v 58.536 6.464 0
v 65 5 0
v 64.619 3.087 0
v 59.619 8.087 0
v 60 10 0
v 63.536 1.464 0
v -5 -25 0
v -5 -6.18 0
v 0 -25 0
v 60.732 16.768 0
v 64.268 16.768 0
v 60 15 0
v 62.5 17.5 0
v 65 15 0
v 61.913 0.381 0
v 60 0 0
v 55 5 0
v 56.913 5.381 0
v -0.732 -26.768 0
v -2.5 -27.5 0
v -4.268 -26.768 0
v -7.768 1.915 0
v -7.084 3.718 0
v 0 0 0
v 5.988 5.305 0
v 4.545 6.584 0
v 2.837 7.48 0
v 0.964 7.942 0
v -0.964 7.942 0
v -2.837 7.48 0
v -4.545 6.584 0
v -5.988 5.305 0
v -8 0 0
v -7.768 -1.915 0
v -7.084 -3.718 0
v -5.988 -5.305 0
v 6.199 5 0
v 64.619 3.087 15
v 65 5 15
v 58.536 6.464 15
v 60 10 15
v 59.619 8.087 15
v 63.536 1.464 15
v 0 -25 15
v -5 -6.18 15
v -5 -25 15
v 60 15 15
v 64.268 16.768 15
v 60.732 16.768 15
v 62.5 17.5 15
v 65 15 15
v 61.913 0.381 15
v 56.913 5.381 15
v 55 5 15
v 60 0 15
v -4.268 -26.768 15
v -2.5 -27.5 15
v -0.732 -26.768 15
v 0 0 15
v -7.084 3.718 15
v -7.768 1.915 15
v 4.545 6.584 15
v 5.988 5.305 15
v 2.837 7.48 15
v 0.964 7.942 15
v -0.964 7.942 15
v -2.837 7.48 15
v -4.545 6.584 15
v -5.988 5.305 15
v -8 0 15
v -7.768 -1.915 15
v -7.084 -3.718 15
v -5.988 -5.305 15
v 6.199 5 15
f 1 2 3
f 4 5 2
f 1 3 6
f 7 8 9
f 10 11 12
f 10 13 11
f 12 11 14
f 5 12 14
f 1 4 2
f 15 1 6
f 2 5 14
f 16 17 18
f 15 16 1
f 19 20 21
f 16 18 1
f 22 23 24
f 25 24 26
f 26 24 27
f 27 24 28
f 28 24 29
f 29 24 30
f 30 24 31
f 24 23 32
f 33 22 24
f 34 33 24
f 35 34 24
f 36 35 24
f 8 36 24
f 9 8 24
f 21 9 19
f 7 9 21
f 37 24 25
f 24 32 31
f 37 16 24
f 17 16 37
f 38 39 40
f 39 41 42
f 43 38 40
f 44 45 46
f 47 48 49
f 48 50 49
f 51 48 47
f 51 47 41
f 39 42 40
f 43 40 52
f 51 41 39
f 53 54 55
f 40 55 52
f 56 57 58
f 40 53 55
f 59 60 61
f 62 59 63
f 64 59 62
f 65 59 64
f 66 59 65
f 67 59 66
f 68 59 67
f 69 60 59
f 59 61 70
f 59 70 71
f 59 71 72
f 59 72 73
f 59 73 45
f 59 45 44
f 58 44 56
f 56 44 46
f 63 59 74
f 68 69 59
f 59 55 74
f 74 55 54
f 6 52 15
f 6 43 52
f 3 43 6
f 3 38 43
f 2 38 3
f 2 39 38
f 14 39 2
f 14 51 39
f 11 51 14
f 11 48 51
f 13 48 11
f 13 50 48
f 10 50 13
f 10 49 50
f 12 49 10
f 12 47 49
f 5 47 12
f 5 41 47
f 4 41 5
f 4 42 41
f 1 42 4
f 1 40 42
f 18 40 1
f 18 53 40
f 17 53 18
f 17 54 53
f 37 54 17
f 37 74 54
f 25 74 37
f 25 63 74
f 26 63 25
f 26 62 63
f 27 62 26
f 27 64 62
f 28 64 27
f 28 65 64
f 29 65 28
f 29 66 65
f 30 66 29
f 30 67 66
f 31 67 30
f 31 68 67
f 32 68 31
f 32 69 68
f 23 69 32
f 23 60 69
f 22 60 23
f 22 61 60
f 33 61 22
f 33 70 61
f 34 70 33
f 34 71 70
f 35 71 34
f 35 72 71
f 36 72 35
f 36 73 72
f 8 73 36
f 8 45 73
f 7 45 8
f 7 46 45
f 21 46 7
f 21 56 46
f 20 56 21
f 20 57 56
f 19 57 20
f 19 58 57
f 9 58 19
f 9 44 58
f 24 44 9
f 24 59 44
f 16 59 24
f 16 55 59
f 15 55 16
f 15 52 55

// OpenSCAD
thickness=5;
length=60;
height=10;
depth=30;
circ=8;
extr=15;


//color("red")
linear_extrude(height = extr) {
    union() {
        square([length,thickness], center =false);
        translate([-thickness,-depth+thickness,0]){
            square([thickness, depth], center =false);
        }
    }

    intersection() {
        translate([length,thickness,0]){
            circle(r=thickness);
        }
        color("blue")
        translate([length,0,0]){
        square([thickness,thickness],center = false);
        }
    }
    
    difference() {
        translate([length-thickness,thickness,0]){
            color("red")
            square([thickness,thickness],center = false);
        }
        translate([length-thickness,thickness*2,0]){
            circle(r=thickness);
        }
    }
    
        translate([length,thickness,0]){
            square([thickness,height],center = false);
        }
        translate([length+thickness/2,thickness+height,0]){
            circle(r=thickness/2);
        }
        translate([-thickness/2,-depth+thickness,0]){
            circle(r=thickness/2);
        }
        
        
        
        difference() {
       
            circle(r=circ);
 
            color("blue")
            translate([0,-circ,0]){
                square([circ,circ],center = false);
            }
        }
        
    
}
